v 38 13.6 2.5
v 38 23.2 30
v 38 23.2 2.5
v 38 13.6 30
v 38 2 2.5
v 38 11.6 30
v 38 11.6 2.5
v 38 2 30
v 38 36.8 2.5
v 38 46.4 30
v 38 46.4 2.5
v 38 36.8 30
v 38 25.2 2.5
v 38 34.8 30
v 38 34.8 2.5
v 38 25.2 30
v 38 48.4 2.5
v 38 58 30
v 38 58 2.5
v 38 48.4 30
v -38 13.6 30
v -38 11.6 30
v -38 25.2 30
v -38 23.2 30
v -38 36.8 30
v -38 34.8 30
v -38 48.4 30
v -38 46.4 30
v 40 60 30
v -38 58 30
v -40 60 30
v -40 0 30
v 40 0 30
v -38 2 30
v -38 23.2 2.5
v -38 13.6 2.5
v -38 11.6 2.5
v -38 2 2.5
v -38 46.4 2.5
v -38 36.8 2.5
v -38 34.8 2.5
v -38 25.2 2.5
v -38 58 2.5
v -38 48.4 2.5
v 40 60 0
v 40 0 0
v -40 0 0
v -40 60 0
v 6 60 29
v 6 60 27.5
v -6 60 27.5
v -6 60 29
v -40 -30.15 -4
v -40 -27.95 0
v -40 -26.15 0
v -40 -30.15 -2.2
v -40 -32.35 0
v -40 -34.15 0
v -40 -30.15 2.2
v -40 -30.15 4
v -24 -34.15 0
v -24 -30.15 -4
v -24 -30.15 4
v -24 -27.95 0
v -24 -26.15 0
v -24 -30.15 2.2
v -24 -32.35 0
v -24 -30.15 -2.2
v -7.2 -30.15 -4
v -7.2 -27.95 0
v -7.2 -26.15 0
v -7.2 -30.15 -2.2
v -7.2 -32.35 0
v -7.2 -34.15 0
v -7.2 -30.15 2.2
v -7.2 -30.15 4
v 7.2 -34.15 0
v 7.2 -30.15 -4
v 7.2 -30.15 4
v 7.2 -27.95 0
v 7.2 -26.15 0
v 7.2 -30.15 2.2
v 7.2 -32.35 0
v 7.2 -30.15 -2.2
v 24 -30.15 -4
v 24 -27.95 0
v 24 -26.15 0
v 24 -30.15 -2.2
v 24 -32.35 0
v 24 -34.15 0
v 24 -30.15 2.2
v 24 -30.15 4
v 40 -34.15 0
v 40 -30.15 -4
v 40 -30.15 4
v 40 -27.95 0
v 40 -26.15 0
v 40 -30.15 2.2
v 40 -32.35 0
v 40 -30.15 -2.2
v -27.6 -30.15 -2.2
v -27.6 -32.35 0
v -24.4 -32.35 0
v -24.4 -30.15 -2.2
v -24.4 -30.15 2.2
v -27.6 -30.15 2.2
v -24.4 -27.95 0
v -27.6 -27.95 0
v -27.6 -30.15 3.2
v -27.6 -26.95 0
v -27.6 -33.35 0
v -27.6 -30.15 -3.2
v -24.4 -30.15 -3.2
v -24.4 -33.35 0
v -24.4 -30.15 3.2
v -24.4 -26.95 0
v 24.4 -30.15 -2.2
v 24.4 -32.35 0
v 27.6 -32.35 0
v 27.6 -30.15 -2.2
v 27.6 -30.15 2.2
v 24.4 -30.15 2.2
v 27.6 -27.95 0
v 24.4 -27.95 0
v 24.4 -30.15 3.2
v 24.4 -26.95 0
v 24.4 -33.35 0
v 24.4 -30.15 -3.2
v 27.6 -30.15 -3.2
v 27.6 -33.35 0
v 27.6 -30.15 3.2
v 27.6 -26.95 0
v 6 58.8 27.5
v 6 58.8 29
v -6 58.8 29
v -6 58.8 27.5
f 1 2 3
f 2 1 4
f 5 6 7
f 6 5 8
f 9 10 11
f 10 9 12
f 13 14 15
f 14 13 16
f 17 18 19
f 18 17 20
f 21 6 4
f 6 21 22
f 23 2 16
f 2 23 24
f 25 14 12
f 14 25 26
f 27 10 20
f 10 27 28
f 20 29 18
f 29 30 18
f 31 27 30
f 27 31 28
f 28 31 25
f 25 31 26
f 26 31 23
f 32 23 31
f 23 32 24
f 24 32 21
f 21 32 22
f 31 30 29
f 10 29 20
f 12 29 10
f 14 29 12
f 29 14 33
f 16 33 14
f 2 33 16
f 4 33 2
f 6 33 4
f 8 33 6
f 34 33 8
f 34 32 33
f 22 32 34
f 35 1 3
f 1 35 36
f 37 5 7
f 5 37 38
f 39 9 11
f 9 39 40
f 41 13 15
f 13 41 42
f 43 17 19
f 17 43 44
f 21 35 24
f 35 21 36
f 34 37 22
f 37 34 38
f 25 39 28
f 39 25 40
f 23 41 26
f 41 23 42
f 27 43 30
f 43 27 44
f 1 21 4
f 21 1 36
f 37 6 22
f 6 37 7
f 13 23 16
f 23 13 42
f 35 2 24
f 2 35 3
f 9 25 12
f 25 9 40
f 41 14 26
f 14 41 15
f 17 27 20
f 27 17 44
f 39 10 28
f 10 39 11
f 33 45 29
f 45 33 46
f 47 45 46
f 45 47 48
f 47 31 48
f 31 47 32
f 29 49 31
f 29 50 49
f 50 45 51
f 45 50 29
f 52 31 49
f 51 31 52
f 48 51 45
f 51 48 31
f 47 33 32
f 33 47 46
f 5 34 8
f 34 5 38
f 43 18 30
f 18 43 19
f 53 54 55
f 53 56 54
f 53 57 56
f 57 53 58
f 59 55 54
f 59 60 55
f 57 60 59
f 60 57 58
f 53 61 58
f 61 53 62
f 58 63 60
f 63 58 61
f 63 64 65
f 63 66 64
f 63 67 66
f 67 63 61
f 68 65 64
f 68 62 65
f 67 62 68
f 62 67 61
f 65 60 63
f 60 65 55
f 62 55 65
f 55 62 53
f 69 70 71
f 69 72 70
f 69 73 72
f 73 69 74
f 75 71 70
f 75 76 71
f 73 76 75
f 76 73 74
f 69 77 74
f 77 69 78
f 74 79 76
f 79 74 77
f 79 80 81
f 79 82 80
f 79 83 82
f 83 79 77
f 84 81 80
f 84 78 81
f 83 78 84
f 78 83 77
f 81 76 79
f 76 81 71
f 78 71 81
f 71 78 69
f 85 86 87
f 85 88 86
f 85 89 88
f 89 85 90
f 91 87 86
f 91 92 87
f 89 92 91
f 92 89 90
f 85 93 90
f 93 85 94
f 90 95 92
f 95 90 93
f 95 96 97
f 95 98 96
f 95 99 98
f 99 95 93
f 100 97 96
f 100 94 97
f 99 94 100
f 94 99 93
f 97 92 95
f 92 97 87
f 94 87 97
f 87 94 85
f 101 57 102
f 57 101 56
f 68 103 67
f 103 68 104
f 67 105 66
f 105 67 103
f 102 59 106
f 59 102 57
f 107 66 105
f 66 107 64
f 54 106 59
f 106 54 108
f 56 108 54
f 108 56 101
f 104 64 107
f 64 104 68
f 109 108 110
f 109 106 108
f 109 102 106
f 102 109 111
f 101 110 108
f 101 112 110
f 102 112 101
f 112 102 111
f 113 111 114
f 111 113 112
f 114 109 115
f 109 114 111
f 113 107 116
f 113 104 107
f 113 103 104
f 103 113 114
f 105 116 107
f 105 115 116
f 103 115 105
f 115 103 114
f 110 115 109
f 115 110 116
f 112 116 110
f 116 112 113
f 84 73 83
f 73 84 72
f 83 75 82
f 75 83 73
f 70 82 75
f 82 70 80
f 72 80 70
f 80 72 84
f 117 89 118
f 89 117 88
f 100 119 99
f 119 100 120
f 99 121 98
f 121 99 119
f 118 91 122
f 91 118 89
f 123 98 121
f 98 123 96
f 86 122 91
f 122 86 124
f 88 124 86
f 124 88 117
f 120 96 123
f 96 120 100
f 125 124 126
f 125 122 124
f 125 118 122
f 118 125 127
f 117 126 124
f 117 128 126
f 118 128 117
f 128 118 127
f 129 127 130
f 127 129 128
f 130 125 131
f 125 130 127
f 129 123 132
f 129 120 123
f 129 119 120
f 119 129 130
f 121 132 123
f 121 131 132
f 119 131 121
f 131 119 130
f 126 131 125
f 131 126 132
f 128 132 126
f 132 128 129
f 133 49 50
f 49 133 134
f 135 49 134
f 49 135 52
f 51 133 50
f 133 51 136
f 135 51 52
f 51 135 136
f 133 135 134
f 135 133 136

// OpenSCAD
/* Box with print-in-place hinge - step 1: params + base */
part = "assembly"; // [base, lid, pin, assembly]

cadverify_only = "";
module instance(name, part, unit = 1) {
    echo(cadverify_instance = [name, part, unit]);
    if (cadverify_only == "" || cadverify_only == name) children();
}

// ---- parameters (mm) ----
W = 80; D = 60; H = 40;          // body outer, closed
baseH = 30;                      // base height
gapZLid = 0.3;                   // lid-base vertical gap
lidBot = baseH + gapZLid;        // 30.3
lidTop = H;                      // 40
axY = 0; axZ = baseH + gapZLid/2; // hinge axis (0, 30.15)
wallT = 2; floorT = 2.5; lidTopT = 2.5;
pinH = 1.8; boreH = 2.2; outH = 4.0; cbH = 3.2; capH = 2.8;
clrR = 0.4; clrA = 0.4;
divT = 2; divTop = 37.2;

// knuckle X intervals
bx10=-40; bx11=-24; lx10=-23.6; lx11=-7.6;
bx20=-7.2; bx21=7.2; lx20=7.6; lx21=23.6; bx30=24; bx31=40;

// generic prism along X from polygon in (Z,Y) mapped: poly points [z,y]
module prism_x(poly, x0, len) {
    translate([x0, 0, 0]) rotate([0,90,0])
        linear_extrude(height=len) polygon(poly);
}
function diamond(h) = [[-h,0],[0,-h],[h,0],[0,h]];

module knuckle_out(x0, len) {
    // diamond cross-section points [z,y] centered at (axZ, axY)
    p = diamond(outH);
    translate([0, axY, axZ]) prism_x(p, x0, len);
}
module bore_small(x0, len) {
    p = diamond(boreH);
    translate([0, axY, axZ]) prism_x(p, x0, len);
}
module bore_cb(x0, len) {
    p = diamond(cbH);
    translate([0, axY, axZ]) prism_x(p, x0, len);
}

function D(h,y0,z0) = [[y0-h,-z0],[y0,-z0-h],[y0+h,-z0],[y0,-z0+h]];
module dia(h,y0,z0,x0,x1) {
    translate([x0,0,0]) rotate([0,90,0])
        linear_extrude(height=x1-x0, convexity=4) polygon(D(h,y0,z0));
}
module base_geo() {
    difference() {
        union() {
            translate([-40,0,0]) cube([80,60,2.5]);            // floor
            translate([-40,0,0]) cube([80,2,30]);              // back wall
            translate([-40,58,0]) cube([80,2,30]);             // front wall
            translate([-40,2,0]) cube([2,56,30]);              // left wall
            translate([38,2,0]) cube([2,56,30]);               // right wall
            for (cy=[12.6,24.2,35.8,47.4])
                translate([-38,cy-1,2.5]) cube([76,2,27.5]);   // dividers
            dia(outH,0,axZ,bx10,bx11);                         // knuckles
            dia(outH,0,axZ,bx20,bx21);
            dia(outH,0,axZ,bx30,bx31);
        }
        // bore channels + cap pockets
        dia(boreH,0,axZ,bx10,bx11); dia(cbH,0,axZ,-27.6,-24.4);
        dia(boreH,0,axZ,bx20,bx21);
        dia(boreH,0,axZ,bx30,bx31); dia(cbH,0,axZ,24.4,27.6);
        // back-wall notches under lid knuckles
        dia(boreH+clrR,0,axZ,lx10,lx11);
        dia(boreH+clrR,0,axZ,lx20,lx21);
        // catch groove in front wall outer face
        translate([-6,58.8,27.5]) cube([12,1.21,1.5]);
    }
}

// stubs
module lid_geo() { cube([0.01,0.01,0.01]); }
module pin_geo() { cube([0.01,0.01,0.01]); }

if (part=="base") { base_geo(); }
else if (part=="lid") { lid_geo(); }
else if (part=="pin") { pin_geo(); }
else if (part=="assembly") {
    instance("base","base") base_geo();
    instance("lid","lid") lid_geo();
    instance("pin","pin") pin_geo();
}
